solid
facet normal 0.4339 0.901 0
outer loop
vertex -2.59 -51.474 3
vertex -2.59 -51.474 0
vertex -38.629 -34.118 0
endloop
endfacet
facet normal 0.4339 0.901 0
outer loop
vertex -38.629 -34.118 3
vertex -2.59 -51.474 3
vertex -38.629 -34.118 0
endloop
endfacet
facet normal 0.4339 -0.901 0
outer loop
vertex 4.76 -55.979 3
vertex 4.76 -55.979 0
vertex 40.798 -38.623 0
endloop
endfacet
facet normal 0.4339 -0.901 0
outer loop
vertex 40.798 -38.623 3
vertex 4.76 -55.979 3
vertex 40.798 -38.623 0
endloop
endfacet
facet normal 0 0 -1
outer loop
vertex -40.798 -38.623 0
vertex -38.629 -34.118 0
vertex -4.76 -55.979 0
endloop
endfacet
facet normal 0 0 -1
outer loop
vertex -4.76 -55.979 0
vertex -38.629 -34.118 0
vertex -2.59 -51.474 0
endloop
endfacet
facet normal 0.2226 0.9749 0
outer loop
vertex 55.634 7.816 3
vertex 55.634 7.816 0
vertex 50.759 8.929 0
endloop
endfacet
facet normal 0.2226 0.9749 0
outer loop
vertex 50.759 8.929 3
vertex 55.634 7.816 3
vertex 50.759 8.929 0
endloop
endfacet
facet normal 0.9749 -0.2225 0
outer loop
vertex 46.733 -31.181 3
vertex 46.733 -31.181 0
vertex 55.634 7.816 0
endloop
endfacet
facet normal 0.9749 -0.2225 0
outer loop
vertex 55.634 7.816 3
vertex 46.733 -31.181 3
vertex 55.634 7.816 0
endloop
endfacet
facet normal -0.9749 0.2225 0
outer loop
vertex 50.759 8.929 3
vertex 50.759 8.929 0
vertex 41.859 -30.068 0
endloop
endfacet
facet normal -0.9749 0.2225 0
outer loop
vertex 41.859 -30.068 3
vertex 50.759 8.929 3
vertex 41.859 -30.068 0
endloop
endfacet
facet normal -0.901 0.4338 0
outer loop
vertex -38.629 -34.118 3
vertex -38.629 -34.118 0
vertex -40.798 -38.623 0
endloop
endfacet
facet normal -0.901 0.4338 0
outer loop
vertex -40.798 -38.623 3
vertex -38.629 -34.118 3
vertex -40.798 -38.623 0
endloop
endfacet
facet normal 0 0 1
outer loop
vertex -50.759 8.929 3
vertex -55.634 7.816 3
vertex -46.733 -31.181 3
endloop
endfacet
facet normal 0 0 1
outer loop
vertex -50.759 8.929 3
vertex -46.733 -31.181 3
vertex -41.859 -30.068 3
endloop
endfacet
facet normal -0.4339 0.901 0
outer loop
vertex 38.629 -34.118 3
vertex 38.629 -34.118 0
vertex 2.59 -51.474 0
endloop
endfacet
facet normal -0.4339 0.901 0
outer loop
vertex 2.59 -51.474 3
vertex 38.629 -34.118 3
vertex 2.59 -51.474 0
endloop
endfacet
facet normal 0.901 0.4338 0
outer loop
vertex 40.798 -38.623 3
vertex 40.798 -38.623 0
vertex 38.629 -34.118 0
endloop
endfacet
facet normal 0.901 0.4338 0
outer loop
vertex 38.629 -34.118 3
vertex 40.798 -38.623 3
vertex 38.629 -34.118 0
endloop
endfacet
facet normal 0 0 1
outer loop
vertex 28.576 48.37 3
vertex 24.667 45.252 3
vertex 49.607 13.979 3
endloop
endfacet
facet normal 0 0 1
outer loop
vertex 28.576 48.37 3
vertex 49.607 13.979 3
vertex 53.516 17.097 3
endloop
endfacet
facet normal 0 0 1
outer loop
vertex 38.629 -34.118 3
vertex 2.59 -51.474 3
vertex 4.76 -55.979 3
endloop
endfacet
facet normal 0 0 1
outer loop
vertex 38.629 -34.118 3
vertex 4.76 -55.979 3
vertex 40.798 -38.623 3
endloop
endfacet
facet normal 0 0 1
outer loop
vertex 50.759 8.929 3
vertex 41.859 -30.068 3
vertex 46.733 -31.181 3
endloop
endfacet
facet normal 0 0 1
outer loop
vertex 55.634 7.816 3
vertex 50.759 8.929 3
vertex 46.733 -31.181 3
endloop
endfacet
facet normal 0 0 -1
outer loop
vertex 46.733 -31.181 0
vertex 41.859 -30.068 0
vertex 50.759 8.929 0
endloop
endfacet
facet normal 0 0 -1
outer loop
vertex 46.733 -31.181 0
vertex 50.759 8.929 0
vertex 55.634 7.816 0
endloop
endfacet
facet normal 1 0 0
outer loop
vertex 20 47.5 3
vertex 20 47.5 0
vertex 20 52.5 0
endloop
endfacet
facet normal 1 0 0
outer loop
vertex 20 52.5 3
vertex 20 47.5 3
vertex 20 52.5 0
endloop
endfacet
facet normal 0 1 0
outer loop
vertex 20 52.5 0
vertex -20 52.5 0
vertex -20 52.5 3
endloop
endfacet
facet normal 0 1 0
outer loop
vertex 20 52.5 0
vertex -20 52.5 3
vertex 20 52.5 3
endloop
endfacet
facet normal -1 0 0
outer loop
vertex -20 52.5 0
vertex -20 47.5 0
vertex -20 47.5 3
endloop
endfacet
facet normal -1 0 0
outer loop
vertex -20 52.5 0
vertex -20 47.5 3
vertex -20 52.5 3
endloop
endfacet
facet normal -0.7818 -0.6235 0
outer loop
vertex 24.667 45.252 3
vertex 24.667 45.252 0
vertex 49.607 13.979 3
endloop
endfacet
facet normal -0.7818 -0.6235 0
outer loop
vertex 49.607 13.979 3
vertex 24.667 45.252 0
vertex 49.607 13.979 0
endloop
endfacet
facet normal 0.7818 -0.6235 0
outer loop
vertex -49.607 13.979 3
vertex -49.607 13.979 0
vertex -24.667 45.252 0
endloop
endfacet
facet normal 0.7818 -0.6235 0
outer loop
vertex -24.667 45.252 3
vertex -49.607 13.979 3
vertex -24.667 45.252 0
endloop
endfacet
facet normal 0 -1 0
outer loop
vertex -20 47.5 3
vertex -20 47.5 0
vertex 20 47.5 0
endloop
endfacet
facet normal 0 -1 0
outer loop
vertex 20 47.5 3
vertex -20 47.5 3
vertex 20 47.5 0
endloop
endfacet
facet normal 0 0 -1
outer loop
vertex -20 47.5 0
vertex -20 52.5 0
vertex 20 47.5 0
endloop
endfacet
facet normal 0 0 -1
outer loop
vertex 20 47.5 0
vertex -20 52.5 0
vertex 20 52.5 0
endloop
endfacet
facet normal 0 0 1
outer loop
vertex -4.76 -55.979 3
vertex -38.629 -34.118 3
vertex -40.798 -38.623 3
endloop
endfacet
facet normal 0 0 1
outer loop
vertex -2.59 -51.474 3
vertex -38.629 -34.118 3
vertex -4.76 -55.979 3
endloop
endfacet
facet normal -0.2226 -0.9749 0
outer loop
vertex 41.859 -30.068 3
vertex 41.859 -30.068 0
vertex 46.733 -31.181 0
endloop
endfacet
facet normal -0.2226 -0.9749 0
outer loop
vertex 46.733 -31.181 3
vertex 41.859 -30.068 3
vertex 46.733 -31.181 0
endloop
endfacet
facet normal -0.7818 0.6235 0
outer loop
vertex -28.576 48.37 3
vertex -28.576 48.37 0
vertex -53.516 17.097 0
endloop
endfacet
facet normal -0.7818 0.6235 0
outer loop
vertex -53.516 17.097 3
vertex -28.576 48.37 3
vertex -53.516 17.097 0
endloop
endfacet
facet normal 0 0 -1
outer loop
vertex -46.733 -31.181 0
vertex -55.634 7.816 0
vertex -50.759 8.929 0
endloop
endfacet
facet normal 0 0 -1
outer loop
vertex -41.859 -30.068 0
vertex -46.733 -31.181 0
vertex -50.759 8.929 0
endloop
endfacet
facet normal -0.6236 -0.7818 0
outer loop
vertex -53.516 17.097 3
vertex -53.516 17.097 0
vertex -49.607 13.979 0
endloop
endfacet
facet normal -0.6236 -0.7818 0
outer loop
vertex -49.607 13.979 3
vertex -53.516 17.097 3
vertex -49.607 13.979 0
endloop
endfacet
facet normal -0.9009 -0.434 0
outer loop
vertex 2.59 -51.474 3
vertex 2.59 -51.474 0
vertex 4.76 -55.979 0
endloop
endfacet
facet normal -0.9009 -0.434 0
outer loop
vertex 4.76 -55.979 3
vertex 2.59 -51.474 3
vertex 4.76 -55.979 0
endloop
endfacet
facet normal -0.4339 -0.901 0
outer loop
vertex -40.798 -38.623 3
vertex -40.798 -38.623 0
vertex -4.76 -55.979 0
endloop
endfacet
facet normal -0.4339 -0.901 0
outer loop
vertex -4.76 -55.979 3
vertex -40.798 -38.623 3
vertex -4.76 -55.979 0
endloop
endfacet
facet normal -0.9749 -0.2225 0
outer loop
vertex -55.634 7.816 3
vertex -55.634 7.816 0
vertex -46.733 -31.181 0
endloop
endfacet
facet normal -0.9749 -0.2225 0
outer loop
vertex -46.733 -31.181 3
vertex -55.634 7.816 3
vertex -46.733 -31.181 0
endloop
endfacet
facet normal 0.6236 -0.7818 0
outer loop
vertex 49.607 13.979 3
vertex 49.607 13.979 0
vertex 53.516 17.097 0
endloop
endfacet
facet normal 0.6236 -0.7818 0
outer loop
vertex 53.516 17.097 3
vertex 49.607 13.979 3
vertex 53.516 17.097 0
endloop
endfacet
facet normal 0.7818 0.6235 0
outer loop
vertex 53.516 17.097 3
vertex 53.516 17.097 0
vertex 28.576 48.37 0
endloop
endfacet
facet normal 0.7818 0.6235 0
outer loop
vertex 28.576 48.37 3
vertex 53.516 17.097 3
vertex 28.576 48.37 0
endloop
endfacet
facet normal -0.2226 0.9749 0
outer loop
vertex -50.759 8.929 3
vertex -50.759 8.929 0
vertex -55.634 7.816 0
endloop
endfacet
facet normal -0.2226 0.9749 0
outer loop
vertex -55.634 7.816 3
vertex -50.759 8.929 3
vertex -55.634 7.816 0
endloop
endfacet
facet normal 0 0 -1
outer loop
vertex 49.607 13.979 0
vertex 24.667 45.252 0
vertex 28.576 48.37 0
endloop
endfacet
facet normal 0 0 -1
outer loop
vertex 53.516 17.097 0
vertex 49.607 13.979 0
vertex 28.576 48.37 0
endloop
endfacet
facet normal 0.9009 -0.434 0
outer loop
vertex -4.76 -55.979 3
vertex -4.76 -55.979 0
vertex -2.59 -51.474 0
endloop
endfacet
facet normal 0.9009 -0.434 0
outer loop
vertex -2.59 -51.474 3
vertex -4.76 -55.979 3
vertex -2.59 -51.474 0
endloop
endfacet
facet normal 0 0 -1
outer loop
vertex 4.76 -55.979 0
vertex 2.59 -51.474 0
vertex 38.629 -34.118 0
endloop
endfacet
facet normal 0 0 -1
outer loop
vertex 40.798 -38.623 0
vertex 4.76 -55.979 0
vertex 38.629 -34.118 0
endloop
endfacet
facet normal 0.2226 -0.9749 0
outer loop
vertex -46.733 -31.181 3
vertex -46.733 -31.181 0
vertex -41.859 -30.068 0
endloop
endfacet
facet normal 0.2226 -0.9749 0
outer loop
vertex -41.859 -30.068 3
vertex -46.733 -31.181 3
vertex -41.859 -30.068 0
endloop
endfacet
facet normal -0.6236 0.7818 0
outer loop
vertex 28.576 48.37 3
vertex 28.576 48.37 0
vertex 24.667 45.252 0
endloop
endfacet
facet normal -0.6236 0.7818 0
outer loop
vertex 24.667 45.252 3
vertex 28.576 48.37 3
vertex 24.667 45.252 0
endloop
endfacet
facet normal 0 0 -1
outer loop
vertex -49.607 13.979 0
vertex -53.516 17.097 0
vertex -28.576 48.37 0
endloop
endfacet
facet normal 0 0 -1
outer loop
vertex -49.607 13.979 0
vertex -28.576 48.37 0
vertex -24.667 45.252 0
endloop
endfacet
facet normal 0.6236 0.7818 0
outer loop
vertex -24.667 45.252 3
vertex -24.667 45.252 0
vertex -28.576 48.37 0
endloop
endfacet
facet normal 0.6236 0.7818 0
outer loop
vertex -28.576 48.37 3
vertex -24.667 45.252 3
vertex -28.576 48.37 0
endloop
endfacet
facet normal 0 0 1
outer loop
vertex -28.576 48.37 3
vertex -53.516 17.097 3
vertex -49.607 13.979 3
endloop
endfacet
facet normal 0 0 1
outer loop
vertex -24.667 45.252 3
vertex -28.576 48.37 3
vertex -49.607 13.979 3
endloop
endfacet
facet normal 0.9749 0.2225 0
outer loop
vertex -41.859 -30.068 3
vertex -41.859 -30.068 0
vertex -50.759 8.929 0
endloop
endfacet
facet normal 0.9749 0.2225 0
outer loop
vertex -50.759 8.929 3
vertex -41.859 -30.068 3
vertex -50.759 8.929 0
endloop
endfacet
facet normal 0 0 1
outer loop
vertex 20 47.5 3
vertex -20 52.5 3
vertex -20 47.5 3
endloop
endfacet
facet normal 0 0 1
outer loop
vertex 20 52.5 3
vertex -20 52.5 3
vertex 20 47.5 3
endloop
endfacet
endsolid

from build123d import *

# Parameters (mm, degrees)
F0_W     = 40
F0_H     = 5
F1_DEPTH = 3


with BuildPart() as f1:
    # F0 (on Top) → F1 (new body)
    with BuildSketch(Plane.XY):
        with Locations((0, 50)):
            Rectangle(F0_W, F0_H)
        Polygon((-49.606791, 13.979136), (-24.667199, 45.252395), (-28.576357, 48.369844), (-53.515949, 17.096585), align=None)
        Polygon((-41.858657, -30.068303), (-50.759495, 8.928814), (-55.634134, 7.816209), (-46.733297, -31.180907), align=None)
        Polygon((-2.5901, -51.473696), (-38.628855, -34.118346), (-40.798274, -38.623191), (-4.759519, -55.97854), align=None)
        Polygon((38.628855, -34.118346), (2.5901, -51.473696), (4.759519, -55.97854), (40.798274, -38.623191), align=None)
        Polygon((50.759495, 8.928814), (41.858657, -30.068303), (46.733297, -31.180907), (55.634134, 7.816209), align=None)
        Polygon((24.667199, 45.252395), (49.606791, 13.979136), (53.515949, 17.096585), (28.576357, 48.369844), align=None)
    extrude(amount=F1_DEPTH)


solid = f1.part
